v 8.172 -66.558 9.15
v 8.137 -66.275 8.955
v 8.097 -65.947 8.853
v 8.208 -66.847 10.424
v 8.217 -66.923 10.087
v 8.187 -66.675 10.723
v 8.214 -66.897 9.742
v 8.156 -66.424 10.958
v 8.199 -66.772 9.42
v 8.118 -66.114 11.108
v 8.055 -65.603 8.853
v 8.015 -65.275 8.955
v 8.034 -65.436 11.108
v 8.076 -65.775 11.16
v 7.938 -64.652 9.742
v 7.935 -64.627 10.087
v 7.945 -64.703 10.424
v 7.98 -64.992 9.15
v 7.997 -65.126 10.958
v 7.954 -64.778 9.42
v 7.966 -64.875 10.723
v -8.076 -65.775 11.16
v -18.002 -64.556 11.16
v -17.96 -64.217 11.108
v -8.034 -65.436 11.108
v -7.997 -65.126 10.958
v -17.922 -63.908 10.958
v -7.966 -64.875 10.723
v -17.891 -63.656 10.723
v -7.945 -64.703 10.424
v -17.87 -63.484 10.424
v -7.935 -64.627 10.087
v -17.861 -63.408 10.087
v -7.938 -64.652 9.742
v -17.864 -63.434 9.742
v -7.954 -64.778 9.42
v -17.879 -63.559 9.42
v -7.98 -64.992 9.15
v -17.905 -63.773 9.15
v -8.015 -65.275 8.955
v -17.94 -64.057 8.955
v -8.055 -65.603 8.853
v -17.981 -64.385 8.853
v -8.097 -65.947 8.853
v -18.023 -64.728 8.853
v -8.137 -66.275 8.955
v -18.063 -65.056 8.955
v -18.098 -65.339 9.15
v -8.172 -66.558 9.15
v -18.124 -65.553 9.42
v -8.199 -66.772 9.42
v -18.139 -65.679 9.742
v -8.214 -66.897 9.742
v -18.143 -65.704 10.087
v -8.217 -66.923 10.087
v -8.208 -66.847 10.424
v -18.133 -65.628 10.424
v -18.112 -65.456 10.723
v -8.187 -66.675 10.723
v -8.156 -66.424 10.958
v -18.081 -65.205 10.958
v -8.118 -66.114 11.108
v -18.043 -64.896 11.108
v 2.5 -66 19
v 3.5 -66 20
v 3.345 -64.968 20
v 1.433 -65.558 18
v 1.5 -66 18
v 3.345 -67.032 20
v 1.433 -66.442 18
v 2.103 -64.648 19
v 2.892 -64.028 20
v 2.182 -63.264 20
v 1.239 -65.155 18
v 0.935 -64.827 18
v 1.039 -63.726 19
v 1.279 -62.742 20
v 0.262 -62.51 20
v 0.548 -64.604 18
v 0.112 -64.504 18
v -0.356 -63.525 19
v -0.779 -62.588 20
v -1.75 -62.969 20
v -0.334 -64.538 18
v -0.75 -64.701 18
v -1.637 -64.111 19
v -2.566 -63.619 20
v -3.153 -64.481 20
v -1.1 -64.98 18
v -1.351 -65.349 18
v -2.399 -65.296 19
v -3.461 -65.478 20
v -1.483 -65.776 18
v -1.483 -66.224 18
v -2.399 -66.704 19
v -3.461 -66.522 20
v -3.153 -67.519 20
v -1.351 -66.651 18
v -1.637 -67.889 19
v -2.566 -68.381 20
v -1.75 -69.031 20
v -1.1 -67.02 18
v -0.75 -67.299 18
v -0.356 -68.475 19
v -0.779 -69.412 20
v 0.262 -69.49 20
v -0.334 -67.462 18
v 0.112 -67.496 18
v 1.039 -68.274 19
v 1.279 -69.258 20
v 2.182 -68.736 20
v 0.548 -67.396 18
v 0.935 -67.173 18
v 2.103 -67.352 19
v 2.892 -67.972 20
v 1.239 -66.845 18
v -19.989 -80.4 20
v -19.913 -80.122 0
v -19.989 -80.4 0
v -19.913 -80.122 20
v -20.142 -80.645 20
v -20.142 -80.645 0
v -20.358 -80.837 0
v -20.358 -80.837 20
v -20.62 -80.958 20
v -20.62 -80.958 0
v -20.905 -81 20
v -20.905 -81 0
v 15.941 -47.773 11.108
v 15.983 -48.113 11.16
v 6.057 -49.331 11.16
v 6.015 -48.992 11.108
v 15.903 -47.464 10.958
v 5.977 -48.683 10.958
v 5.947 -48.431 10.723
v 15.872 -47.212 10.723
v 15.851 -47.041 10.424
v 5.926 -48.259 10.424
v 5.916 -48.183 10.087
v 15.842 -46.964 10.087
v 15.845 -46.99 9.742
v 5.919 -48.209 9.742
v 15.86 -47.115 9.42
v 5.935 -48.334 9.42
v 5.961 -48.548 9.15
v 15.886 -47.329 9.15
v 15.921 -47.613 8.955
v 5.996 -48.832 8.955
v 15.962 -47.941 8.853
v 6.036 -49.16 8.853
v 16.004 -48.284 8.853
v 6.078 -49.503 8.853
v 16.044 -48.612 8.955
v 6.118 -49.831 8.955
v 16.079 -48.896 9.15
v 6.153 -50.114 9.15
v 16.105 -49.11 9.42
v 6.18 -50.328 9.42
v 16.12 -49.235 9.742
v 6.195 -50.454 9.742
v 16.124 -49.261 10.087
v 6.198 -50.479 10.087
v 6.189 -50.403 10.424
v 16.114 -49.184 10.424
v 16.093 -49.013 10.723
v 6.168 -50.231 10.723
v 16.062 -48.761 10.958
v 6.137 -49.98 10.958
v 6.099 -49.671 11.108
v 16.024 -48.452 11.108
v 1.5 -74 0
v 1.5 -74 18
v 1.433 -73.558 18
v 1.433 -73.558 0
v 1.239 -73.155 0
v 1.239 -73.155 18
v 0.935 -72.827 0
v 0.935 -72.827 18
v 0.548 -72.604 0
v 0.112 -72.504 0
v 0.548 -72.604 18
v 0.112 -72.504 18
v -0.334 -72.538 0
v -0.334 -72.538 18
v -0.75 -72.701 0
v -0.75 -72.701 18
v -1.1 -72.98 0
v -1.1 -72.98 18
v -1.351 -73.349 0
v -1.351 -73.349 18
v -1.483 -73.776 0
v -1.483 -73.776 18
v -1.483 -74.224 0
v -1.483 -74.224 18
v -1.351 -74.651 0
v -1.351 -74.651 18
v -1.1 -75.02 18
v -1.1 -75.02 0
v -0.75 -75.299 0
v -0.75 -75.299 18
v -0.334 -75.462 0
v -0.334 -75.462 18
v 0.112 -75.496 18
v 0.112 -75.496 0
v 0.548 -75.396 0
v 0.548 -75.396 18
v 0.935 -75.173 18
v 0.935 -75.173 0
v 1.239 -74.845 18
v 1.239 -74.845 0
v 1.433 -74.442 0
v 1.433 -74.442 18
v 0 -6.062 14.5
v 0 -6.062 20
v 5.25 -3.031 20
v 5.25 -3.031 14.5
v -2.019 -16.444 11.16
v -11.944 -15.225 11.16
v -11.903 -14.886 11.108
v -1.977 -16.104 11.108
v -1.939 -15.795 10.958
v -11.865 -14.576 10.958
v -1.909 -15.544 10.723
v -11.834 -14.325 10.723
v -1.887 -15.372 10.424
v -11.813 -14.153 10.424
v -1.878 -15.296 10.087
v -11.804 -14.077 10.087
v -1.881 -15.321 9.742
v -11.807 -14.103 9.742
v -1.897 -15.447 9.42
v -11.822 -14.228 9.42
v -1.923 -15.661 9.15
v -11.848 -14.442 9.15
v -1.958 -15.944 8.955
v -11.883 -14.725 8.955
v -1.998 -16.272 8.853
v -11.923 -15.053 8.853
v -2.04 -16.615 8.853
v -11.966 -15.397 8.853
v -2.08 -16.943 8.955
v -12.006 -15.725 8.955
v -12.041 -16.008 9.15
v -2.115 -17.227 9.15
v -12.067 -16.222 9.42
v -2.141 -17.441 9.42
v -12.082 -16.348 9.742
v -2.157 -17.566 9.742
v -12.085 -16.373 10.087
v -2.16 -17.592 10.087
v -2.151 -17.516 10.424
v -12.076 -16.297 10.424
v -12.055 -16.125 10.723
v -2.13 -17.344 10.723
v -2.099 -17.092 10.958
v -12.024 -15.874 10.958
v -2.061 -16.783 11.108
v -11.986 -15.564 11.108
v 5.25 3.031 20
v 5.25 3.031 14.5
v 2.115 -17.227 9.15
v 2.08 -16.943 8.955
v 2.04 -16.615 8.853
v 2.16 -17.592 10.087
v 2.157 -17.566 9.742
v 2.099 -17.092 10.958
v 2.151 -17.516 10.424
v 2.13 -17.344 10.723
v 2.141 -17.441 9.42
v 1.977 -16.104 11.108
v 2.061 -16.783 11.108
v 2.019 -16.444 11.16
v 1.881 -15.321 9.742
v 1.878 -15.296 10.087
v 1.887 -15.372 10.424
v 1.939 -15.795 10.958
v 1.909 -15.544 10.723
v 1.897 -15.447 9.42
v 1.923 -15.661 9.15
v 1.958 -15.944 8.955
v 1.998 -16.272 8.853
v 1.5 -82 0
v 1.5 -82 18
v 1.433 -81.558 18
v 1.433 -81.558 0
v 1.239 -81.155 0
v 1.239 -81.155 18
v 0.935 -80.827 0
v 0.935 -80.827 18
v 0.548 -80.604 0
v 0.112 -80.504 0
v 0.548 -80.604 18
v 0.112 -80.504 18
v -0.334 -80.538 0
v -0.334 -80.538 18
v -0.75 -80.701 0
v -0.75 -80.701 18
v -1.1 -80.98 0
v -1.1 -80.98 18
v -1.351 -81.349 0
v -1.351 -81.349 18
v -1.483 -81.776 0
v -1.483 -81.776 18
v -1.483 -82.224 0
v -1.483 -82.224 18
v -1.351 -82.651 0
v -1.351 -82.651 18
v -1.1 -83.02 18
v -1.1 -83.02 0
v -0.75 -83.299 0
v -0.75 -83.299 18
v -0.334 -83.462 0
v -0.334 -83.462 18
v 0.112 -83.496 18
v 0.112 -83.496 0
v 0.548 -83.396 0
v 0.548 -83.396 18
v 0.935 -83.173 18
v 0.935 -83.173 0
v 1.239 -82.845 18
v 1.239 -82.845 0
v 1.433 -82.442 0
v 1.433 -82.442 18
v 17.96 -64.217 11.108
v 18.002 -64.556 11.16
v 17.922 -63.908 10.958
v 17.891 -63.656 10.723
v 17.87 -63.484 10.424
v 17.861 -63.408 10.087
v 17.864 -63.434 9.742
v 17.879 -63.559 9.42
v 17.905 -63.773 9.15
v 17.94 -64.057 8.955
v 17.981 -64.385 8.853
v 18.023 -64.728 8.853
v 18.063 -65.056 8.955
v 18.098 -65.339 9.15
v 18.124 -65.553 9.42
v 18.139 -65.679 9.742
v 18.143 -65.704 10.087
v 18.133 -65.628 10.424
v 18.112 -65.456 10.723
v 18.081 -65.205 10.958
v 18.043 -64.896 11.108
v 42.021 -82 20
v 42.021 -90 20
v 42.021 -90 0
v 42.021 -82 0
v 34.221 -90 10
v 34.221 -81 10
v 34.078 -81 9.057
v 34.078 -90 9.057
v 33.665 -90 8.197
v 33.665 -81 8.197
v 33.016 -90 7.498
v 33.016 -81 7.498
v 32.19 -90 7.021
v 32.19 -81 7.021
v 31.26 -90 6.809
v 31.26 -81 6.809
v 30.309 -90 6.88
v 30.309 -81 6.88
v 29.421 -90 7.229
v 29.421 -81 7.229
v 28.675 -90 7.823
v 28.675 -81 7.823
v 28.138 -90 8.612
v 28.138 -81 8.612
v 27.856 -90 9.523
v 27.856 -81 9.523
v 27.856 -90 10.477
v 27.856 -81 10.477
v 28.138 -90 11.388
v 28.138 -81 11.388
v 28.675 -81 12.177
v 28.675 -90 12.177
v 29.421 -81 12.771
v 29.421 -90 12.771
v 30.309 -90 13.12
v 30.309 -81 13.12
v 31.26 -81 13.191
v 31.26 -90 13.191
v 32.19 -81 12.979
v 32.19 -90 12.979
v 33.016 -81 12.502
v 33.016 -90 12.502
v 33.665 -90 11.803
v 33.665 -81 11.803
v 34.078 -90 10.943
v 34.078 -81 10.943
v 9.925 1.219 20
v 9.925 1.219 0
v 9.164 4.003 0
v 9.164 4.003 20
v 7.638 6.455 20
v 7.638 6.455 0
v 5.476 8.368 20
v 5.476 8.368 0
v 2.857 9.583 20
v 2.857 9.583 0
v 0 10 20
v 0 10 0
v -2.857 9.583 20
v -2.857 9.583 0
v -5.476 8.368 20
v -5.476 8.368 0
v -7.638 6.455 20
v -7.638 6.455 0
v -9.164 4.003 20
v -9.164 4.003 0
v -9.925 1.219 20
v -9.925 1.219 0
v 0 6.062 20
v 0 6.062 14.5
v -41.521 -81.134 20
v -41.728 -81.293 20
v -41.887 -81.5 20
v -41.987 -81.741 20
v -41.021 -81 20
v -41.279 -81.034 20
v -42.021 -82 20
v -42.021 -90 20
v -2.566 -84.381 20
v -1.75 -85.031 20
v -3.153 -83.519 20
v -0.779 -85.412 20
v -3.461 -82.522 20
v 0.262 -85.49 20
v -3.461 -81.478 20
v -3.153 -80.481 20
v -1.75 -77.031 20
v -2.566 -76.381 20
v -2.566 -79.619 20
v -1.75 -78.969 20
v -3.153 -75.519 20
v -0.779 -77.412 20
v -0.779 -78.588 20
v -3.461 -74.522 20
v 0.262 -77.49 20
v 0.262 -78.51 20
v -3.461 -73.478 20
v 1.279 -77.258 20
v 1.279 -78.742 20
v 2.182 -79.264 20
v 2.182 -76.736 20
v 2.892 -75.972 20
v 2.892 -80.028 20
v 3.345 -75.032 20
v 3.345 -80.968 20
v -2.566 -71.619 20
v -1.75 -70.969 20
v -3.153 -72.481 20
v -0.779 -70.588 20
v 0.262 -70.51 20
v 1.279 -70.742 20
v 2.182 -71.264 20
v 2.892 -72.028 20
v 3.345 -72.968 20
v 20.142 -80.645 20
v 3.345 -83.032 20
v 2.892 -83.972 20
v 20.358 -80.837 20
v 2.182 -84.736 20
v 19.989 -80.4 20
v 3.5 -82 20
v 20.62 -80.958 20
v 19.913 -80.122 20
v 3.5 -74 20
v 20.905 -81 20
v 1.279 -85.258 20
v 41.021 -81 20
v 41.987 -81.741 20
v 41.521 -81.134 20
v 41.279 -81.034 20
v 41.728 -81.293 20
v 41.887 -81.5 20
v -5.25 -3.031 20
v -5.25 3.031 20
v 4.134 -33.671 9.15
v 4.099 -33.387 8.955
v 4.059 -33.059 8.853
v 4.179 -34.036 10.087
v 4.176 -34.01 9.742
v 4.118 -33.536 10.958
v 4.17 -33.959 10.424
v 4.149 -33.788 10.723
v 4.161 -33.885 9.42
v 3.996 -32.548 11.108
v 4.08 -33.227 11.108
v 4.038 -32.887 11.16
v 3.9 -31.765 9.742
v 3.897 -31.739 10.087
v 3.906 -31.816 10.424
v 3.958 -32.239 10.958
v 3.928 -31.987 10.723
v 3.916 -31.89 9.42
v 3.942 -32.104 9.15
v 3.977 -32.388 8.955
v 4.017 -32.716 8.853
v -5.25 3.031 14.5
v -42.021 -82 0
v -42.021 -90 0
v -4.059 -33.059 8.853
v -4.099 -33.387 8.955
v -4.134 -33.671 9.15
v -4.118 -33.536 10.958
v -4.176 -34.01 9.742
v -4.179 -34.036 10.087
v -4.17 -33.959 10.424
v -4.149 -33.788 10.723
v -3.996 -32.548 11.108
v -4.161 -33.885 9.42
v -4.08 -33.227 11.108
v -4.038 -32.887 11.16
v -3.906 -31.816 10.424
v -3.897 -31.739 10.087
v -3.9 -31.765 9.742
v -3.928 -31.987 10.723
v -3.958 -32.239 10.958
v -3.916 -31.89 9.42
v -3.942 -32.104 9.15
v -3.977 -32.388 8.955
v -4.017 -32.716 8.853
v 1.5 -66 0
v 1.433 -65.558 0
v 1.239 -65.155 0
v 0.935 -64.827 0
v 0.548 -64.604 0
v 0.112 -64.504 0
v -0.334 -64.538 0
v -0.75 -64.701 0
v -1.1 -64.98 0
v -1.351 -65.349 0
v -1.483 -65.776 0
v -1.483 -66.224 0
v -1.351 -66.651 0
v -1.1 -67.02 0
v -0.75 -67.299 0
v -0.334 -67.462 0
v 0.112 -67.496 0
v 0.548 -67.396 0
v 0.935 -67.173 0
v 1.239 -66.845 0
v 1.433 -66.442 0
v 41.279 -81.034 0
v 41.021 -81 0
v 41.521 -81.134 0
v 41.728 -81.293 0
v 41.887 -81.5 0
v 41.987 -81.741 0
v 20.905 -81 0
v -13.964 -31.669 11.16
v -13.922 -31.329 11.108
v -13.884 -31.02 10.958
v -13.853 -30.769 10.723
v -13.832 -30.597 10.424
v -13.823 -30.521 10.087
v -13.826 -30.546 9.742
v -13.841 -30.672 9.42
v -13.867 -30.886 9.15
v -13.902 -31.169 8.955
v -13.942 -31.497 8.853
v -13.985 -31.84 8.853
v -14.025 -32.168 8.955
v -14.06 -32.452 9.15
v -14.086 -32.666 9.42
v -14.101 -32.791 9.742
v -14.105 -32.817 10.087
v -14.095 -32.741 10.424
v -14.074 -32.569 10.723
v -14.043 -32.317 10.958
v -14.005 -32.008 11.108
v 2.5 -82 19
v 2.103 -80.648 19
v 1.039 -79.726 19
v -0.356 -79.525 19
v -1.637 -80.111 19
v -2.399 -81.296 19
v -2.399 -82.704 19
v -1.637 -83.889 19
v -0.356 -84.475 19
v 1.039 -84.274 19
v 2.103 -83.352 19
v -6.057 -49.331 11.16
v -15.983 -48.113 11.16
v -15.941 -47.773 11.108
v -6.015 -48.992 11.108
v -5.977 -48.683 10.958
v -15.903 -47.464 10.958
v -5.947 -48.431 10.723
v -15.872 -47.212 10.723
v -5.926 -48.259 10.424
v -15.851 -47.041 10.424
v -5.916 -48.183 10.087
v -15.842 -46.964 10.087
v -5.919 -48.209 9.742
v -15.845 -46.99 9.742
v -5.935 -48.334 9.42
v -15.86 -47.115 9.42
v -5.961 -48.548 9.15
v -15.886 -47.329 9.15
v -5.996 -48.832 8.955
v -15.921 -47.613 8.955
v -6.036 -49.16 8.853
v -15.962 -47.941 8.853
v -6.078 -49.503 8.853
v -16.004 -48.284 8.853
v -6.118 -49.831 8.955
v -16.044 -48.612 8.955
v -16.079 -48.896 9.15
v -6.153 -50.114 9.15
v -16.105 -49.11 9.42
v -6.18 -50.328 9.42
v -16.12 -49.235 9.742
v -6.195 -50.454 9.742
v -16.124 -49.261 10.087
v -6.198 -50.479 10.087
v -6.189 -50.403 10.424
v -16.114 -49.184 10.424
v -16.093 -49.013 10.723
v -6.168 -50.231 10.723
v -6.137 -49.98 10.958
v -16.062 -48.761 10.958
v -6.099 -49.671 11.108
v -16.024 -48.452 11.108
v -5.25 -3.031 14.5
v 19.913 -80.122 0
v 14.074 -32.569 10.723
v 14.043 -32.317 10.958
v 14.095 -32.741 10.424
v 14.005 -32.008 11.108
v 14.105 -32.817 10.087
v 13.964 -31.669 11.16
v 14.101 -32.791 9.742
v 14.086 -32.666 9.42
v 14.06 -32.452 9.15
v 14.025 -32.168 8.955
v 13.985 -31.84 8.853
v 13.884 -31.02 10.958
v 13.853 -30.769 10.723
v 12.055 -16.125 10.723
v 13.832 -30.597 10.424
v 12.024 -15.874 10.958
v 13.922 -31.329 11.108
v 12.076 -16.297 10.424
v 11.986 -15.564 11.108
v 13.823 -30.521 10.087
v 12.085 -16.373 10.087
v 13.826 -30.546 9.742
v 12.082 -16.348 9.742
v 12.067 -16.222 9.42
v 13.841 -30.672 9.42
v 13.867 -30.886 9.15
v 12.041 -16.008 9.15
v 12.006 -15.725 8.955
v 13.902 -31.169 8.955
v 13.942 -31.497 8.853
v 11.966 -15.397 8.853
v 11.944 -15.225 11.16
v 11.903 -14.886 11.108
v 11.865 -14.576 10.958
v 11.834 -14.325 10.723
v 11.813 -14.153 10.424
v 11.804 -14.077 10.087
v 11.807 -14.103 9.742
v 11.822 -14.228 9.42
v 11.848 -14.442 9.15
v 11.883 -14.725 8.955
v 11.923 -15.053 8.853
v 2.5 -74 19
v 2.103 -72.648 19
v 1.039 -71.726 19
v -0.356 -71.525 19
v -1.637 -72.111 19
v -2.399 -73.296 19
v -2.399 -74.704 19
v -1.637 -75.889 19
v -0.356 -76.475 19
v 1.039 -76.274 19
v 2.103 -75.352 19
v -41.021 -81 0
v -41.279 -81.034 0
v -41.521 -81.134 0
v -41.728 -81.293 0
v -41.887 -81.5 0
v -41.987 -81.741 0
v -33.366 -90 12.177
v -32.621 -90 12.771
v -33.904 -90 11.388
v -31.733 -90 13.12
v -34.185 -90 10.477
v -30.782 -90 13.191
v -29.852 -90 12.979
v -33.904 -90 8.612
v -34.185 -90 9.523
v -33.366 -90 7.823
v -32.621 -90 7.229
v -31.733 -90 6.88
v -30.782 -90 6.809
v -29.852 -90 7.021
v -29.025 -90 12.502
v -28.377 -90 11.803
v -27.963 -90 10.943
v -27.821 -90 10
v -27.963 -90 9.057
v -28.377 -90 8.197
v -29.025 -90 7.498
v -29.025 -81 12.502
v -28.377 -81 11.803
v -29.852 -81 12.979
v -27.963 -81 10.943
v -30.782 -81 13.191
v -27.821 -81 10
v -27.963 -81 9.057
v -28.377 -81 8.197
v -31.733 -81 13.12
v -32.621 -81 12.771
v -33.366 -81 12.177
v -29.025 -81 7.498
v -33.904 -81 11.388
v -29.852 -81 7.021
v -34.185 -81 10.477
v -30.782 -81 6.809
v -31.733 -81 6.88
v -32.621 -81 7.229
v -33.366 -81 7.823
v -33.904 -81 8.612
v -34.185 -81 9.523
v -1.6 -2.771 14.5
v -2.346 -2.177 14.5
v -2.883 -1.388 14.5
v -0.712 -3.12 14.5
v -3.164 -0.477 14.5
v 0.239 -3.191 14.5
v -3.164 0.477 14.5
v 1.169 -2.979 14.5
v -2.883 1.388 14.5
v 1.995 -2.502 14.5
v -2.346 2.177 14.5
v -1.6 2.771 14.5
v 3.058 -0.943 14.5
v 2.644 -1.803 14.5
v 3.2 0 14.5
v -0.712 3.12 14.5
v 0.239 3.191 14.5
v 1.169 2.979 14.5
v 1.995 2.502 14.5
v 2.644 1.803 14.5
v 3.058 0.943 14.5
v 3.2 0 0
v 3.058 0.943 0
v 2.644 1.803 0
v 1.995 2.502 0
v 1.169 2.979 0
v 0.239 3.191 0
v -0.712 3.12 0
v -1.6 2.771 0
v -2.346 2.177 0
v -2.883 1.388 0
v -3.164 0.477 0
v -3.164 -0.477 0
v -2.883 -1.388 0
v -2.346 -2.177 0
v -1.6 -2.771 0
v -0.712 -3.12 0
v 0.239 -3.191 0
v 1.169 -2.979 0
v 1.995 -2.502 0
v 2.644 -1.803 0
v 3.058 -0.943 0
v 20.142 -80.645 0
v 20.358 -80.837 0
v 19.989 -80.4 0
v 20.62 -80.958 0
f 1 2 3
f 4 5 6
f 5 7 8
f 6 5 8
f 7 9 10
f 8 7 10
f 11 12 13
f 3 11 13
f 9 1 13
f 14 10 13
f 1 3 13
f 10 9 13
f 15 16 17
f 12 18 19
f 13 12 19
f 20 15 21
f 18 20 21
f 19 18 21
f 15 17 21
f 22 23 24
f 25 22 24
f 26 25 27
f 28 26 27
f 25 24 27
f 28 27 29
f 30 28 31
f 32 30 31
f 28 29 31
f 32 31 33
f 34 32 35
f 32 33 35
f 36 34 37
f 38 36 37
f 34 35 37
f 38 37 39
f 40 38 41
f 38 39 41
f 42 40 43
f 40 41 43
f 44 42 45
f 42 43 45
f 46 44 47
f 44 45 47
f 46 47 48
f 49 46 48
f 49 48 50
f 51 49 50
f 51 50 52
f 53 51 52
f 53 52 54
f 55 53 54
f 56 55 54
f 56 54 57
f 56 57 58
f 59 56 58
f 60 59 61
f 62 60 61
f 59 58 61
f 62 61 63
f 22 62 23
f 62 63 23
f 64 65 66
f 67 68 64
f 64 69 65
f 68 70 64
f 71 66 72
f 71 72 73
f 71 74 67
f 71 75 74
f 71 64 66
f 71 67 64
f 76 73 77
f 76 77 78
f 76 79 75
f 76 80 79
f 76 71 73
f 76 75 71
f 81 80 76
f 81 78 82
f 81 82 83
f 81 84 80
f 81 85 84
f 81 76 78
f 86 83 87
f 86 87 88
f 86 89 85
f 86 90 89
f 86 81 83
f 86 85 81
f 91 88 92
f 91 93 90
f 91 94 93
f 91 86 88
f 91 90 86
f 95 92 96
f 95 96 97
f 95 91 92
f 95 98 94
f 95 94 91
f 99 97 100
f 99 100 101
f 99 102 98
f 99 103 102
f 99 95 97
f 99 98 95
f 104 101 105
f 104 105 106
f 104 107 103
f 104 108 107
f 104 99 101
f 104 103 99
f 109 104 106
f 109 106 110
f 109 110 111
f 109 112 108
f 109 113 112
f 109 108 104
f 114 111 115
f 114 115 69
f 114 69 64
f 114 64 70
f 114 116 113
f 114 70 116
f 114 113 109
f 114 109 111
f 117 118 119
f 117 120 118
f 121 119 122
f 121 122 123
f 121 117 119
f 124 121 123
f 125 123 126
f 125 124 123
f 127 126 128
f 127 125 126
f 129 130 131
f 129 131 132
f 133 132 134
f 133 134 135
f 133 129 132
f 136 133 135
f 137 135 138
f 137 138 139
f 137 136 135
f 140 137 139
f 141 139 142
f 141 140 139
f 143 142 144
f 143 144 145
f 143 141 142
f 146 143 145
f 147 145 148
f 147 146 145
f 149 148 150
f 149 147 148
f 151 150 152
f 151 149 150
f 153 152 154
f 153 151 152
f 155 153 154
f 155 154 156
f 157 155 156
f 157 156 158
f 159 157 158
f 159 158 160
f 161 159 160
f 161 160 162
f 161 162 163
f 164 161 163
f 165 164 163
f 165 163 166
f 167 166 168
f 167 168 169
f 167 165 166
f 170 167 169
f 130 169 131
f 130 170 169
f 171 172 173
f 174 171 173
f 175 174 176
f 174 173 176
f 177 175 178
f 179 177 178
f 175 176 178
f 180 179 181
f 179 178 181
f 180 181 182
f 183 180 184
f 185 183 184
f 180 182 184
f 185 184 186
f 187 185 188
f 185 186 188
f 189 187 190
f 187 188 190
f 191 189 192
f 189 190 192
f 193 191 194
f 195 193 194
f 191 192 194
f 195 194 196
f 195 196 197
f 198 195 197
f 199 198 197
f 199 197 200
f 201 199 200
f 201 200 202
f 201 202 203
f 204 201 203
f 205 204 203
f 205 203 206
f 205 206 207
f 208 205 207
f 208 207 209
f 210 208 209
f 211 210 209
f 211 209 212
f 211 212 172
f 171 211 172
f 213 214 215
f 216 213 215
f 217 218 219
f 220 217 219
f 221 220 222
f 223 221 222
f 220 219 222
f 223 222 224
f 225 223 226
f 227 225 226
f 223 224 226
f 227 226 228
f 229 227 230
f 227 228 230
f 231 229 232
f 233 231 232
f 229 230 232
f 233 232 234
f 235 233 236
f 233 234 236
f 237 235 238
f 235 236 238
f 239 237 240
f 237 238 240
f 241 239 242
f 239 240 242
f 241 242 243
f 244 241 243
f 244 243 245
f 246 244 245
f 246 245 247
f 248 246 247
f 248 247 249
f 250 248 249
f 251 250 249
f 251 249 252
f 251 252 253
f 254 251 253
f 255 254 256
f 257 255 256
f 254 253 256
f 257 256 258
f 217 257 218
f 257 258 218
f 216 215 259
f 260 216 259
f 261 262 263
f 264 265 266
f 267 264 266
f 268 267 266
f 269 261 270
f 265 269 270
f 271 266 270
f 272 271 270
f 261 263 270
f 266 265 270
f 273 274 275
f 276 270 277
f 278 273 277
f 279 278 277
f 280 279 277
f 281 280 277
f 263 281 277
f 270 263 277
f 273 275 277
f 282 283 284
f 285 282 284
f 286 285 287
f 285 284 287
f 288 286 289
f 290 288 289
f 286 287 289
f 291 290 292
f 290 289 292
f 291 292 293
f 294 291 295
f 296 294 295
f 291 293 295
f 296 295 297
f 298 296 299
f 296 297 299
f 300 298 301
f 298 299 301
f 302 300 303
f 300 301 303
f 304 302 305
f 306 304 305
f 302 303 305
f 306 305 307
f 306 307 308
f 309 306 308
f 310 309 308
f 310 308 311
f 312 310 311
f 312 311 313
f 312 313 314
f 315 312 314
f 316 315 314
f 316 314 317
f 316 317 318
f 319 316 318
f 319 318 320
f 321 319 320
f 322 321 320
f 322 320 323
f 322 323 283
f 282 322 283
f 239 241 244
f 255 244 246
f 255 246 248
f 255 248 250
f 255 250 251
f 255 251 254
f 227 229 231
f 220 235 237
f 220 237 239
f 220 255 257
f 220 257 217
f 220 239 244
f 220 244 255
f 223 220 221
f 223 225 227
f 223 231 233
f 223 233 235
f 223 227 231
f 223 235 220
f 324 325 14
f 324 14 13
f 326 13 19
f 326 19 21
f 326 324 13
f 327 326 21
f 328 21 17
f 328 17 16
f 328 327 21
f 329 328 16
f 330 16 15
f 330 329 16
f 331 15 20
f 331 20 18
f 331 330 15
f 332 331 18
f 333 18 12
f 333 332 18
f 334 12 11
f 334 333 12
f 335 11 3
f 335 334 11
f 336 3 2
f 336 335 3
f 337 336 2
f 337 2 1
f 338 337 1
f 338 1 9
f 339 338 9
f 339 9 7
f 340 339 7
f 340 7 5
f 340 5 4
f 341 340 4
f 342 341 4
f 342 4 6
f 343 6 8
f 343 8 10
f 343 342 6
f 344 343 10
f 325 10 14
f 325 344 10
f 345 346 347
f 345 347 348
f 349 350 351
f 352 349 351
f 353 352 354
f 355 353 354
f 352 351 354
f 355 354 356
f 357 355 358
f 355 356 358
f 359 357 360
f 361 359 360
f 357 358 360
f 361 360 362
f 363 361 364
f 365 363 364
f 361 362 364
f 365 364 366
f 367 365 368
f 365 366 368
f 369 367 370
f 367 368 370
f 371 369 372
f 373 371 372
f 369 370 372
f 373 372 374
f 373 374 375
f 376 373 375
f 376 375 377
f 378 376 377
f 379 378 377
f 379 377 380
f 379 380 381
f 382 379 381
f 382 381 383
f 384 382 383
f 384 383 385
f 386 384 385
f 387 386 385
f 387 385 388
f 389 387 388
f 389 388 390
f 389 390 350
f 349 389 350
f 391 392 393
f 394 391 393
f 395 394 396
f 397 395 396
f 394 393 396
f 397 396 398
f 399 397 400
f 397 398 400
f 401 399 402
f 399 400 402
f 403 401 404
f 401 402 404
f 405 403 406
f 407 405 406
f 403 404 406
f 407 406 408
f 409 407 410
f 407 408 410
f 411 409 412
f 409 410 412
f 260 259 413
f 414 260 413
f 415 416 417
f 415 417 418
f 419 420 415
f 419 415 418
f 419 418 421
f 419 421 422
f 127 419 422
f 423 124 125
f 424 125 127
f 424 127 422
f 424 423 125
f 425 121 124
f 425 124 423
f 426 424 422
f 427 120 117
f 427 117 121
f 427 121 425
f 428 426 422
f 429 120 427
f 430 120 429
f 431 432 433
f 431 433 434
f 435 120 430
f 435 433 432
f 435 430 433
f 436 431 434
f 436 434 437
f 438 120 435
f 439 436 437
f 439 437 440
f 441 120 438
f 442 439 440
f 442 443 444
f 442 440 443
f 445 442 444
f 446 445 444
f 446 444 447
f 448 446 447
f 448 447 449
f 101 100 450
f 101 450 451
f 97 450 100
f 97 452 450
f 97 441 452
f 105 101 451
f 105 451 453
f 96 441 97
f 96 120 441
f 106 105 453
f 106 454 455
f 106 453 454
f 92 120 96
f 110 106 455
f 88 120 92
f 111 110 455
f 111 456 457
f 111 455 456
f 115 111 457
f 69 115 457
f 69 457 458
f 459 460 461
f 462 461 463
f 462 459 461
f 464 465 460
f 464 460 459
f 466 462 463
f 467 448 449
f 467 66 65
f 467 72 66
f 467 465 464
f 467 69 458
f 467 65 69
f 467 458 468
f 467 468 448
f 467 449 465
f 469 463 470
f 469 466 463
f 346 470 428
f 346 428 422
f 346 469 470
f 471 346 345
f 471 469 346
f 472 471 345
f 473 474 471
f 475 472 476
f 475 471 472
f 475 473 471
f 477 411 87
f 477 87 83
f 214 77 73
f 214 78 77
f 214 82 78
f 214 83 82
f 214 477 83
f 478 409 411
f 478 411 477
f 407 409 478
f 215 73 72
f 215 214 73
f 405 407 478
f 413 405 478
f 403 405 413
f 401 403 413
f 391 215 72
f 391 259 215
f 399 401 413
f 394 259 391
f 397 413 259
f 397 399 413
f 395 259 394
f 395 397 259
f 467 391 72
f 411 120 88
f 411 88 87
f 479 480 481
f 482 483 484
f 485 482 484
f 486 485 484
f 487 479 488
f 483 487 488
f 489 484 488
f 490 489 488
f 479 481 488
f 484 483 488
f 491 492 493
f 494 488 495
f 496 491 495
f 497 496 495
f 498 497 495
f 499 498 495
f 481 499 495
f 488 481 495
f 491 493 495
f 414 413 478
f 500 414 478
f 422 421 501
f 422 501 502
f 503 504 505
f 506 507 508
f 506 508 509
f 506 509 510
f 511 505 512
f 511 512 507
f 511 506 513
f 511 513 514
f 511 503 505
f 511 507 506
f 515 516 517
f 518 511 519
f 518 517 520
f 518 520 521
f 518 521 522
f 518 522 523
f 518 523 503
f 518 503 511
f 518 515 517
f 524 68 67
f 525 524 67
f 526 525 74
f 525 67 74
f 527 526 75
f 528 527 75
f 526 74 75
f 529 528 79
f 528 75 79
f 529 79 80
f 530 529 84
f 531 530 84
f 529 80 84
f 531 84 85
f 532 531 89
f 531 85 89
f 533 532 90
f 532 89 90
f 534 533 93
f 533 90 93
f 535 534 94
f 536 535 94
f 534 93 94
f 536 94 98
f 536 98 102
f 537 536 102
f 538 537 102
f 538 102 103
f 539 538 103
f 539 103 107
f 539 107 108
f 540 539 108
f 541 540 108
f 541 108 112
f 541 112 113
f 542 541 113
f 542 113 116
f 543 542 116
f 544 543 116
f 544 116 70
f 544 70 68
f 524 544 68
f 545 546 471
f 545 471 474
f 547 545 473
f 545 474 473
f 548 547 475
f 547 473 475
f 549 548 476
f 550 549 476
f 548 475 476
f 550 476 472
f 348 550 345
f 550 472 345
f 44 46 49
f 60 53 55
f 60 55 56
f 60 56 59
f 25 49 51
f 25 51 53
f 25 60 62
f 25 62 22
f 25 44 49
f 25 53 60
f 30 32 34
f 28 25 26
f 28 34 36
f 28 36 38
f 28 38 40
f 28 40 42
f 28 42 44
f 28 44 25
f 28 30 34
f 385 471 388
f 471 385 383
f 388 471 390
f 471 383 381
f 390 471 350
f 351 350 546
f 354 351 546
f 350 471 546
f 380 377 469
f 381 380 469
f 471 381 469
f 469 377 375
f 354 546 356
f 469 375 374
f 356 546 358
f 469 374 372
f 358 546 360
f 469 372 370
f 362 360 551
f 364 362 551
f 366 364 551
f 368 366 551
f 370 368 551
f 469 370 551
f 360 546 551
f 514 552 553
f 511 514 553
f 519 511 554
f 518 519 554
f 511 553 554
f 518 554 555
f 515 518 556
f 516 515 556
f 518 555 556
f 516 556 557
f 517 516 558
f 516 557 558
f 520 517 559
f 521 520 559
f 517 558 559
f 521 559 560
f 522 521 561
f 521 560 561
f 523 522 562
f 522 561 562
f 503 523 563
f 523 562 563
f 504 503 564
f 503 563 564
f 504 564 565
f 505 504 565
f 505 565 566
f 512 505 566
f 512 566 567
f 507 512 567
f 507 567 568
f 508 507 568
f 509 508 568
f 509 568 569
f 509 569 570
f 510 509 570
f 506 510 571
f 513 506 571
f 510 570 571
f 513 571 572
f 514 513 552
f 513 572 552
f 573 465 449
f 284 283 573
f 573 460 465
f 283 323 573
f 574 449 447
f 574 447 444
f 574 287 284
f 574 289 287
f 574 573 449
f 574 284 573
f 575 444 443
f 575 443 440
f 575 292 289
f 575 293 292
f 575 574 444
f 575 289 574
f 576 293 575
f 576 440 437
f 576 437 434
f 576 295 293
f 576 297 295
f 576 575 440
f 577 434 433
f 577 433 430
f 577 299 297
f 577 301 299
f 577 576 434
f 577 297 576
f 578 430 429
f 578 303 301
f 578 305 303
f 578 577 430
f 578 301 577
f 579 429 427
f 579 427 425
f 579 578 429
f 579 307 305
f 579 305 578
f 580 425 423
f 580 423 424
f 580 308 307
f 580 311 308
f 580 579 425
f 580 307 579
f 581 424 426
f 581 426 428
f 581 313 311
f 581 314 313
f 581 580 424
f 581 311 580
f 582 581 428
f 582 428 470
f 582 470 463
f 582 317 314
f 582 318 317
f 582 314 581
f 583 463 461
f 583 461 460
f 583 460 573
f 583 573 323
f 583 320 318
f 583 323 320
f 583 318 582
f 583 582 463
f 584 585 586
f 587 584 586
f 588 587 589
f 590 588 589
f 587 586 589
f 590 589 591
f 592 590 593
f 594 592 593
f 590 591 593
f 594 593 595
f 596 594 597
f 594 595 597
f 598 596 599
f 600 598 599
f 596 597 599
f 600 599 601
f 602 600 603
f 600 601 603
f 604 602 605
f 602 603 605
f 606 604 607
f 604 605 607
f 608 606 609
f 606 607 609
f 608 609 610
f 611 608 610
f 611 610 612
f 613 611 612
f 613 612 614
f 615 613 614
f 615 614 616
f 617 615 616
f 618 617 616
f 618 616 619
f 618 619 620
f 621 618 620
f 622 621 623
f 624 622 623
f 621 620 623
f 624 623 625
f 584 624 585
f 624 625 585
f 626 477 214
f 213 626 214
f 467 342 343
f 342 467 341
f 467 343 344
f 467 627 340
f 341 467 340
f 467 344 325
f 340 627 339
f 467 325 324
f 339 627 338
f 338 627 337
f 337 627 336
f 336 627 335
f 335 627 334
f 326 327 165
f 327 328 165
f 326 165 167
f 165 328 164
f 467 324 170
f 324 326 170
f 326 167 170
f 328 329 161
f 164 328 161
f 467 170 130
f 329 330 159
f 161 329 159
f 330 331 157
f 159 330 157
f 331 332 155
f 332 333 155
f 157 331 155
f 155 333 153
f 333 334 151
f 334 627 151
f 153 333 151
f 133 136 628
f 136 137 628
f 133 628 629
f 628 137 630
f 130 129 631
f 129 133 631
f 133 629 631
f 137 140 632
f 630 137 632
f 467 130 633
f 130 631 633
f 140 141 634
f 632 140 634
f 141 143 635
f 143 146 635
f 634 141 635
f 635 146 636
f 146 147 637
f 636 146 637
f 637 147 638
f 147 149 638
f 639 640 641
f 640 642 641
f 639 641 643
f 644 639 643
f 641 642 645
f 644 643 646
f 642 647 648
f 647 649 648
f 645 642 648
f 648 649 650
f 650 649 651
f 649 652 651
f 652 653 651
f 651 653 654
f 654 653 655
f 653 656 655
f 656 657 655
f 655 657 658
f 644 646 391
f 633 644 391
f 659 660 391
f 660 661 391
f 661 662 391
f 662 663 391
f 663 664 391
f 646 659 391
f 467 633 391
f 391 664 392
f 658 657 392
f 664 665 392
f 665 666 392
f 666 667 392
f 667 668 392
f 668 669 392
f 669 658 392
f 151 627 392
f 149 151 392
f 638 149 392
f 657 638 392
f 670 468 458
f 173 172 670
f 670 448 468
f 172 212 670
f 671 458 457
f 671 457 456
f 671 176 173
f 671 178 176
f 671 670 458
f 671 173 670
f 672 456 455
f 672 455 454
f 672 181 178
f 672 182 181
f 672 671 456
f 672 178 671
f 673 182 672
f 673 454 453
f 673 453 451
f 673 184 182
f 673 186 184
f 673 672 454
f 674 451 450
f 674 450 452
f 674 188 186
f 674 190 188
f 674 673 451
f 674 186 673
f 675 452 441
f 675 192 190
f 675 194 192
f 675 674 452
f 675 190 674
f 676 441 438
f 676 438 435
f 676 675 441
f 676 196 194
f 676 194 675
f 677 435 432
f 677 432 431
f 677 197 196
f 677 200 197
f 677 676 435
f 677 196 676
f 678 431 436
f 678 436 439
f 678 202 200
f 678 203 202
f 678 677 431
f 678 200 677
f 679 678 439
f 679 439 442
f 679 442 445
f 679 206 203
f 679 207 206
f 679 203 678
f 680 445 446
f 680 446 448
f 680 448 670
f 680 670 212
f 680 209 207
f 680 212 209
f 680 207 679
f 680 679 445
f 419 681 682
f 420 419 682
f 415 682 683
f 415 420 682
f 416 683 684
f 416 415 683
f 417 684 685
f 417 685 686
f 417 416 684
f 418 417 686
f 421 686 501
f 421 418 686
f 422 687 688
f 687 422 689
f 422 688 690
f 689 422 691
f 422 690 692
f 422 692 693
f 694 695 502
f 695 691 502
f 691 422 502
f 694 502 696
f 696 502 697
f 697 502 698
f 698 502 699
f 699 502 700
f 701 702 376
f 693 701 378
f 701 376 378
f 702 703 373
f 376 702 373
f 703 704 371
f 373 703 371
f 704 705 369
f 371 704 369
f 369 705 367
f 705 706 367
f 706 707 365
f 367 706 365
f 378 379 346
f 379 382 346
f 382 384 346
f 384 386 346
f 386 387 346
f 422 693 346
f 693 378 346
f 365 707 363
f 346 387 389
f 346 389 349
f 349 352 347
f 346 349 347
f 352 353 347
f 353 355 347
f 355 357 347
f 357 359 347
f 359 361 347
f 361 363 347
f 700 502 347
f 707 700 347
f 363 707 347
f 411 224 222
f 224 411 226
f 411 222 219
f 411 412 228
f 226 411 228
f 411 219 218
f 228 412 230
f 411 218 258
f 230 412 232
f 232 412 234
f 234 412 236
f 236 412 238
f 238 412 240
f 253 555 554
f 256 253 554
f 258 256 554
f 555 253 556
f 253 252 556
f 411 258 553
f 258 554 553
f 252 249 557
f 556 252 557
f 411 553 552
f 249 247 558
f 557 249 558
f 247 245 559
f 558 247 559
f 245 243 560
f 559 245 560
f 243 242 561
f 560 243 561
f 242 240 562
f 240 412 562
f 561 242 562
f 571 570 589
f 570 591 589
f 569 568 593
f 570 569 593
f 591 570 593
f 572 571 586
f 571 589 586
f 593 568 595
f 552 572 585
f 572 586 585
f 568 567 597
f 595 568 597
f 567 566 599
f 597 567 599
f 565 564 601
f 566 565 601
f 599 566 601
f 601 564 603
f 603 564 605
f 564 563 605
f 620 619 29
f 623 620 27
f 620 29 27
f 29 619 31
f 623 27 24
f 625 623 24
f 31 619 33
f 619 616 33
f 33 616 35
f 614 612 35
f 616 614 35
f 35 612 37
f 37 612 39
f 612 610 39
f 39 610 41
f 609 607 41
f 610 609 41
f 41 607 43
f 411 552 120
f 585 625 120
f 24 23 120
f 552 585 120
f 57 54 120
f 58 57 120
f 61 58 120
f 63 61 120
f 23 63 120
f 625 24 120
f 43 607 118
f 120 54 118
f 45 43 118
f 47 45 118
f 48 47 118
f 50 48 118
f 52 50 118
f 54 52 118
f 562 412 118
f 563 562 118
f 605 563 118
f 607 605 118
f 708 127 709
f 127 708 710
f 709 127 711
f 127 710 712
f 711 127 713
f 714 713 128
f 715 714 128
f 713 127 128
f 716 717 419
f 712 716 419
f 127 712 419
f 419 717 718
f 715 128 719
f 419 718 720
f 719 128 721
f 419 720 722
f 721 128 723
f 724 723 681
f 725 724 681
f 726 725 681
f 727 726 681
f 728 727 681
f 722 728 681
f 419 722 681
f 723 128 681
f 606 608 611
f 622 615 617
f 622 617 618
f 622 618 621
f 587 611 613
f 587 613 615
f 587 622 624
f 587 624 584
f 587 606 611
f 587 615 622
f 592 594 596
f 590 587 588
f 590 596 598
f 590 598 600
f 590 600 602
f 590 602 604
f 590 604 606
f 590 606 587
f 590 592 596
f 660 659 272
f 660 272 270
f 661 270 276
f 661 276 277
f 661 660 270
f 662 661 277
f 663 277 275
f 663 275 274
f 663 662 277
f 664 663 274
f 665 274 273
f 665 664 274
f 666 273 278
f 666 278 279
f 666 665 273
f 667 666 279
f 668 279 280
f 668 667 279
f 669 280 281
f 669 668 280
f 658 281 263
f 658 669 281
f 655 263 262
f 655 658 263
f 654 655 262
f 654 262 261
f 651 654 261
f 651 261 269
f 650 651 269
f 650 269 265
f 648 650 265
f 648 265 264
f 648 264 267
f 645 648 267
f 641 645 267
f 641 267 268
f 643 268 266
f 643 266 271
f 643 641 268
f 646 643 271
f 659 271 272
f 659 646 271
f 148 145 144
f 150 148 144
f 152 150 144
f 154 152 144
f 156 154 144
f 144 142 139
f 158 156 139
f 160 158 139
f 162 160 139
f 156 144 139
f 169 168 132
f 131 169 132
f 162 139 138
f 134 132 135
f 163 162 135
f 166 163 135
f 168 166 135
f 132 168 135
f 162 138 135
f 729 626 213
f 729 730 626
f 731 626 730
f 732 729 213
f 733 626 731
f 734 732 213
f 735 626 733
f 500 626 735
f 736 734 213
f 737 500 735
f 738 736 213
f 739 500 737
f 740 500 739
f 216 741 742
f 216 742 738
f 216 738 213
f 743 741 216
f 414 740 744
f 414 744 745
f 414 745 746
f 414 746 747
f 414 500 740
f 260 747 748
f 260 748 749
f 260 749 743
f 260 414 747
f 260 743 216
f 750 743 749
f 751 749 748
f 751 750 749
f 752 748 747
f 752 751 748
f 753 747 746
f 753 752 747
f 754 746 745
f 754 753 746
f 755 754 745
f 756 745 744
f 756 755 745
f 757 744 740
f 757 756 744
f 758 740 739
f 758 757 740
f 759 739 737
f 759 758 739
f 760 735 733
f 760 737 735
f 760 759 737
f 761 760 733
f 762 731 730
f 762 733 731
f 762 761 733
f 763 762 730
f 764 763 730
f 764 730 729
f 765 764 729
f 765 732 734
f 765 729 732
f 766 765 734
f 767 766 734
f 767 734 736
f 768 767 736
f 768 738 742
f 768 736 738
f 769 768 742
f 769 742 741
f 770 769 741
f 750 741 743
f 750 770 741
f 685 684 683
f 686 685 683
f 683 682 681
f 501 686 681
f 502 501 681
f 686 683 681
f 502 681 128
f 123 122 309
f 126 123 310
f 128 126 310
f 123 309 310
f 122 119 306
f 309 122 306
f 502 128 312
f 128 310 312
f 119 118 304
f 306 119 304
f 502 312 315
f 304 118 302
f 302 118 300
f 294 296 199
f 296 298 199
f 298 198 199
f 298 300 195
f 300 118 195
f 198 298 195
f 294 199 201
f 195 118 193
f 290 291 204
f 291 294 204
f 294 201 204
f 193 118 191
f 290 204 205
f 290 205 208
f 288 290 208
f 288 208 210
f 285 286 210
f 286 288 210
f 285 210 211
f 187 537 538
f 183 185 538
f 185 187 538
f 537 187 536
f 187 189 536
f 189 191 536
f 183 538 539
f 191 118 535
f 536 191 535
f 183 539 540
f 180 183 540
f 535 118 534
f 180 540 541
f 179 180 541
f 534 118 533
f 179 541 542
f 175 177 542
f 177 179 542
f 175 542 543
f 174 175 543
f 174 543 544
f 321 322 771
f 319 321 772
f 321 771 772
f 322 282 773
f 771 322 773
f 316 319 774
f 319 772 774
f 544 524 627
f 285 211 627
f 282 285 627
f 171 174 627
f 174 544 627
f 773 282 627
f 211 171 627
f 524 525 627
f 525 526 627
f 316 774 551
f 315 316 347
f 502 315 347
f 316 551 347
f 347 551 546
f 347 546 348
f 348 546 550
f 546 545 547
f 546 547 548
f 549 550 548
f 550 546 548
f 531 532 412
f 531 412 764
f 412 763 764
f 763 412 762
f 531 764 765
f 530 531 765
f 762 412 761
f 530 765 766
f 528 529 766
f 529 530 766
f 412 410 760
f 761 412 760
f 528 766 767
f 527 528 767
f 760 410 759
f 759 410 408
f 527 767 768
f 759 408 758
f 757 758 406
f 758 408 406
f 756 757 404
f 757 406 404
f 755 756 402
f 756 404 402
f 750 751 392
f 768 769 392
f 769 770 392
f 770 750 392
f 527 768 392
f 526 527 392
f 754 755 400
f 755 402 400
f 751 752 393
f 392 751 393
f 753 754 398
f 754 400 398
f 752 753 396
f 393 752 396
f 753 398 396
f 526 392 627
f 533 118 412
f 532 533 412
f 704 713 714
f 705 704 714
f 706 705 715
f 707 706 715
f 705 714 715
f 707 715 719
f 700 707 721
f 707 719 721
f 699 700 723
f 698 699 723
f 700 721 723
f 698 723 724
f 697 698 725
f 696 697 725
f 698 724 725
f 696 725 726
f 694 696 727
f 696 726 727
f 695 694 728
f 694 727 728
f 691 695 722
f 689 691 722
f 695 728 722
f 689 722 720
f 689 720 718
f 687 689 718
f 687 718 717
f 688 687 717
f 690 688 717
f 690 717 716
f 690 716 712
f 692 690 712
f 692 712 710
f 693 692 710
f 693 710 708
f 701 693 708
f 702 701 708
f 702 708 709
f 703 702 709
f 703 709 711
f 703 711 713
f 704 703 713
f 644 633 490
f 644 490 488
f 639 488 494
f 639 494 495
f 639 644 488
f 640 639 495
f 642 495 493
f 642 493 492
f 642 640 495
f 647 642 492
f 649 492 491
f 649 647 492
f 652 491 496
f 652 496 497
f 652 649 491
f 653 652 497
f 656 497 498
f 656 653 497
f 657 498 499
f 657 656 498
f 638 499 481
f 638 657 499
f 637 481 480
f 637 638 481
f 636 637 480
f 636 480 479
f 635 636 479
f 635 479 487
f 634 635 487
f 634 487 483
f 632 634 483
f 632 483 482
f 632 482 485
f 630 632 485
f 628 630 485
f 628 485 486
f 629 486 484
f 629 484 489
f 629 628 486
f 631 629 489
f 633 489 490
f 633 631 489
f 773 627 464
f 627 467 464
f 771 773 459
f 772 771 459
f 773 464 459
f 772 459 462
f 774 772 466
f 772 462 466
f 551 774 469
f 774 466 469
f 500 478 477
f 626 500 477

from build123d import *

# Parameters (mm, degrees)
SKETCH1_R           = 3.2
BOSS_EXTRUDE1_DEPTH = 20
SKETCH3_R           = 3.2
CUT_EXTRUDE1_DEPTH  = 10
CUT_EXTRUDE2_DEPTH  = 5.5
SKETCH6_R           = 1.5
CUT_EXTRUDE4_DEPTH  = 21
CHAMFER1_SIZE       = 2
SKETCH8_R           = 1.16
CUT_EXTRUDE5_DEPTH  = 10
FILLET1_R           = 1


with BuildPart() as part:
    # Sketch1 → Boss-Extrude1 (new body)
    with BuildSketch(Plane.XY):
        with BuildLine():
            Line((20.020647688, -81), (9.925461516, 1.218693434))
            ThreePointArc((9.925461516, 1.218693434), (0, 10), (-9.925461516, 1.218693434))
            Line((-9.925461516, 1.218693434), (-20.020647688, -81))
            Line((-20.020647688, -81), (-42.020647688, -81))
            Line((-42.020647688, -81), (-42.020647688, -90))
            Line((-42.020647688, -90), (42.020647688, -90))
            Line((42.020647688, -90), (42.020647688, -81))
            Line((42.020647688, -81), (20.020647688, -81))
        make_face()
        Circle(SKETCH1_R, mode=Mode.SUBTRACT)
    extrude(amount=BOSS_EXTRUDE1_DEPTH)

    # Sketch3 → Cut-Extrude1 (cut, through all)
    with BuildSketch(Plane(origin=(0, -81, 0), x_dir=(1, 0, 0), z_dir=(0, 1, 0))):
        with Locations((-31.020647688, -10)):
            Circle(SKETCH3_R)
        with Locations((31.020647688, -10)):
            Circle(SKETCH3_R)
    extrude(amount=-CUT_EXTRUDE1_DEPTH, mode=Mode.SUBTRACT)

    # Sketch4 → Cut-Extrude2 (cut)
    with BuildSketch(Plane.XY.offset(20)):
        Polygon((0, 6.062177826), (-5.25, 3.031088913), (-5.25, -3.031088913), (0, -6.062177826), (5.25, -3.031088913), (5.25, 3.031088913), align=None)
    extrude(amount=-CUT_EXTRUDE2_DEPTH, mode=Mode.SUBTRACT)

    # Sketch6 → Cut-Extrude4 (cut, through all)
    with BuildSketch(Plane.XY.offset(20)):
        with Locations((0, -66)):
            Circle(SKETCH6_R)
        with Locations((0, -74)):
            Circle(SKETCH6_R)
        with Locations((0, -82)):
            Circle(SKETCH6_R)
    extrude(amount=-CUT_EXTRUDE4_DEPTH, mode=Mode.SUBTRACT)

    # Chamfer1
    chamfer1_edges = [part.edges().sort_by_distance(p)[0] for p in [
        (-1.5, -66, 20),
        (-1.5, -74, 20),
        (-1.5, -82, 20),
    ]]
    chamfer(chamfer1_edges, length=CHAMFER1_SIZE)

    # Sketch8 → Cut-Extrude5 (cut)
    with BuildSketch(Plane(origin=(-9.925461516, 1.218693434, 0), x_dir=(0, 0, 1), z_dir=(-0.992546152, 0.121869343, 0))):
        with Locations((10, -16.567228294)):
            Circle(SKETCH8_R)
        with Locations((10, -33.134456588)):
            Circle(SKETCH8_R)
        with Locations((10, -49.701684883)):
            Circle(SKETCH8_R)
        with Locations((10, -66.268913177)):
            Circle(SKETCH8_R)
    cut_extrude5 = extrude(amount=-CUT_EXTRUDE5_DEPTH, mode=Mode.SUBTRACT)

    # Mirror1: Cut-Extrude5 across plane
    add(cut_extrude5.mirror(Plane(origin=(0, 0, 0), x_dir=(0, 0, 1), z_dir=(1, 0, 0))), mode=Mode.SUBTRACT)

    # Fillet1
    fillet1_edges = [part.edges().sort_by_distance(p)[0] for p in [
        (-42.020647688, -81, 10),
        (-20.020647688, -81, 10),
        (20.020647688, -81, 10),
        (42.020647688, -81, 10),
    ]]
    fillet(fillet1_edges, radius=FILLET1_R)


solid = part.part
